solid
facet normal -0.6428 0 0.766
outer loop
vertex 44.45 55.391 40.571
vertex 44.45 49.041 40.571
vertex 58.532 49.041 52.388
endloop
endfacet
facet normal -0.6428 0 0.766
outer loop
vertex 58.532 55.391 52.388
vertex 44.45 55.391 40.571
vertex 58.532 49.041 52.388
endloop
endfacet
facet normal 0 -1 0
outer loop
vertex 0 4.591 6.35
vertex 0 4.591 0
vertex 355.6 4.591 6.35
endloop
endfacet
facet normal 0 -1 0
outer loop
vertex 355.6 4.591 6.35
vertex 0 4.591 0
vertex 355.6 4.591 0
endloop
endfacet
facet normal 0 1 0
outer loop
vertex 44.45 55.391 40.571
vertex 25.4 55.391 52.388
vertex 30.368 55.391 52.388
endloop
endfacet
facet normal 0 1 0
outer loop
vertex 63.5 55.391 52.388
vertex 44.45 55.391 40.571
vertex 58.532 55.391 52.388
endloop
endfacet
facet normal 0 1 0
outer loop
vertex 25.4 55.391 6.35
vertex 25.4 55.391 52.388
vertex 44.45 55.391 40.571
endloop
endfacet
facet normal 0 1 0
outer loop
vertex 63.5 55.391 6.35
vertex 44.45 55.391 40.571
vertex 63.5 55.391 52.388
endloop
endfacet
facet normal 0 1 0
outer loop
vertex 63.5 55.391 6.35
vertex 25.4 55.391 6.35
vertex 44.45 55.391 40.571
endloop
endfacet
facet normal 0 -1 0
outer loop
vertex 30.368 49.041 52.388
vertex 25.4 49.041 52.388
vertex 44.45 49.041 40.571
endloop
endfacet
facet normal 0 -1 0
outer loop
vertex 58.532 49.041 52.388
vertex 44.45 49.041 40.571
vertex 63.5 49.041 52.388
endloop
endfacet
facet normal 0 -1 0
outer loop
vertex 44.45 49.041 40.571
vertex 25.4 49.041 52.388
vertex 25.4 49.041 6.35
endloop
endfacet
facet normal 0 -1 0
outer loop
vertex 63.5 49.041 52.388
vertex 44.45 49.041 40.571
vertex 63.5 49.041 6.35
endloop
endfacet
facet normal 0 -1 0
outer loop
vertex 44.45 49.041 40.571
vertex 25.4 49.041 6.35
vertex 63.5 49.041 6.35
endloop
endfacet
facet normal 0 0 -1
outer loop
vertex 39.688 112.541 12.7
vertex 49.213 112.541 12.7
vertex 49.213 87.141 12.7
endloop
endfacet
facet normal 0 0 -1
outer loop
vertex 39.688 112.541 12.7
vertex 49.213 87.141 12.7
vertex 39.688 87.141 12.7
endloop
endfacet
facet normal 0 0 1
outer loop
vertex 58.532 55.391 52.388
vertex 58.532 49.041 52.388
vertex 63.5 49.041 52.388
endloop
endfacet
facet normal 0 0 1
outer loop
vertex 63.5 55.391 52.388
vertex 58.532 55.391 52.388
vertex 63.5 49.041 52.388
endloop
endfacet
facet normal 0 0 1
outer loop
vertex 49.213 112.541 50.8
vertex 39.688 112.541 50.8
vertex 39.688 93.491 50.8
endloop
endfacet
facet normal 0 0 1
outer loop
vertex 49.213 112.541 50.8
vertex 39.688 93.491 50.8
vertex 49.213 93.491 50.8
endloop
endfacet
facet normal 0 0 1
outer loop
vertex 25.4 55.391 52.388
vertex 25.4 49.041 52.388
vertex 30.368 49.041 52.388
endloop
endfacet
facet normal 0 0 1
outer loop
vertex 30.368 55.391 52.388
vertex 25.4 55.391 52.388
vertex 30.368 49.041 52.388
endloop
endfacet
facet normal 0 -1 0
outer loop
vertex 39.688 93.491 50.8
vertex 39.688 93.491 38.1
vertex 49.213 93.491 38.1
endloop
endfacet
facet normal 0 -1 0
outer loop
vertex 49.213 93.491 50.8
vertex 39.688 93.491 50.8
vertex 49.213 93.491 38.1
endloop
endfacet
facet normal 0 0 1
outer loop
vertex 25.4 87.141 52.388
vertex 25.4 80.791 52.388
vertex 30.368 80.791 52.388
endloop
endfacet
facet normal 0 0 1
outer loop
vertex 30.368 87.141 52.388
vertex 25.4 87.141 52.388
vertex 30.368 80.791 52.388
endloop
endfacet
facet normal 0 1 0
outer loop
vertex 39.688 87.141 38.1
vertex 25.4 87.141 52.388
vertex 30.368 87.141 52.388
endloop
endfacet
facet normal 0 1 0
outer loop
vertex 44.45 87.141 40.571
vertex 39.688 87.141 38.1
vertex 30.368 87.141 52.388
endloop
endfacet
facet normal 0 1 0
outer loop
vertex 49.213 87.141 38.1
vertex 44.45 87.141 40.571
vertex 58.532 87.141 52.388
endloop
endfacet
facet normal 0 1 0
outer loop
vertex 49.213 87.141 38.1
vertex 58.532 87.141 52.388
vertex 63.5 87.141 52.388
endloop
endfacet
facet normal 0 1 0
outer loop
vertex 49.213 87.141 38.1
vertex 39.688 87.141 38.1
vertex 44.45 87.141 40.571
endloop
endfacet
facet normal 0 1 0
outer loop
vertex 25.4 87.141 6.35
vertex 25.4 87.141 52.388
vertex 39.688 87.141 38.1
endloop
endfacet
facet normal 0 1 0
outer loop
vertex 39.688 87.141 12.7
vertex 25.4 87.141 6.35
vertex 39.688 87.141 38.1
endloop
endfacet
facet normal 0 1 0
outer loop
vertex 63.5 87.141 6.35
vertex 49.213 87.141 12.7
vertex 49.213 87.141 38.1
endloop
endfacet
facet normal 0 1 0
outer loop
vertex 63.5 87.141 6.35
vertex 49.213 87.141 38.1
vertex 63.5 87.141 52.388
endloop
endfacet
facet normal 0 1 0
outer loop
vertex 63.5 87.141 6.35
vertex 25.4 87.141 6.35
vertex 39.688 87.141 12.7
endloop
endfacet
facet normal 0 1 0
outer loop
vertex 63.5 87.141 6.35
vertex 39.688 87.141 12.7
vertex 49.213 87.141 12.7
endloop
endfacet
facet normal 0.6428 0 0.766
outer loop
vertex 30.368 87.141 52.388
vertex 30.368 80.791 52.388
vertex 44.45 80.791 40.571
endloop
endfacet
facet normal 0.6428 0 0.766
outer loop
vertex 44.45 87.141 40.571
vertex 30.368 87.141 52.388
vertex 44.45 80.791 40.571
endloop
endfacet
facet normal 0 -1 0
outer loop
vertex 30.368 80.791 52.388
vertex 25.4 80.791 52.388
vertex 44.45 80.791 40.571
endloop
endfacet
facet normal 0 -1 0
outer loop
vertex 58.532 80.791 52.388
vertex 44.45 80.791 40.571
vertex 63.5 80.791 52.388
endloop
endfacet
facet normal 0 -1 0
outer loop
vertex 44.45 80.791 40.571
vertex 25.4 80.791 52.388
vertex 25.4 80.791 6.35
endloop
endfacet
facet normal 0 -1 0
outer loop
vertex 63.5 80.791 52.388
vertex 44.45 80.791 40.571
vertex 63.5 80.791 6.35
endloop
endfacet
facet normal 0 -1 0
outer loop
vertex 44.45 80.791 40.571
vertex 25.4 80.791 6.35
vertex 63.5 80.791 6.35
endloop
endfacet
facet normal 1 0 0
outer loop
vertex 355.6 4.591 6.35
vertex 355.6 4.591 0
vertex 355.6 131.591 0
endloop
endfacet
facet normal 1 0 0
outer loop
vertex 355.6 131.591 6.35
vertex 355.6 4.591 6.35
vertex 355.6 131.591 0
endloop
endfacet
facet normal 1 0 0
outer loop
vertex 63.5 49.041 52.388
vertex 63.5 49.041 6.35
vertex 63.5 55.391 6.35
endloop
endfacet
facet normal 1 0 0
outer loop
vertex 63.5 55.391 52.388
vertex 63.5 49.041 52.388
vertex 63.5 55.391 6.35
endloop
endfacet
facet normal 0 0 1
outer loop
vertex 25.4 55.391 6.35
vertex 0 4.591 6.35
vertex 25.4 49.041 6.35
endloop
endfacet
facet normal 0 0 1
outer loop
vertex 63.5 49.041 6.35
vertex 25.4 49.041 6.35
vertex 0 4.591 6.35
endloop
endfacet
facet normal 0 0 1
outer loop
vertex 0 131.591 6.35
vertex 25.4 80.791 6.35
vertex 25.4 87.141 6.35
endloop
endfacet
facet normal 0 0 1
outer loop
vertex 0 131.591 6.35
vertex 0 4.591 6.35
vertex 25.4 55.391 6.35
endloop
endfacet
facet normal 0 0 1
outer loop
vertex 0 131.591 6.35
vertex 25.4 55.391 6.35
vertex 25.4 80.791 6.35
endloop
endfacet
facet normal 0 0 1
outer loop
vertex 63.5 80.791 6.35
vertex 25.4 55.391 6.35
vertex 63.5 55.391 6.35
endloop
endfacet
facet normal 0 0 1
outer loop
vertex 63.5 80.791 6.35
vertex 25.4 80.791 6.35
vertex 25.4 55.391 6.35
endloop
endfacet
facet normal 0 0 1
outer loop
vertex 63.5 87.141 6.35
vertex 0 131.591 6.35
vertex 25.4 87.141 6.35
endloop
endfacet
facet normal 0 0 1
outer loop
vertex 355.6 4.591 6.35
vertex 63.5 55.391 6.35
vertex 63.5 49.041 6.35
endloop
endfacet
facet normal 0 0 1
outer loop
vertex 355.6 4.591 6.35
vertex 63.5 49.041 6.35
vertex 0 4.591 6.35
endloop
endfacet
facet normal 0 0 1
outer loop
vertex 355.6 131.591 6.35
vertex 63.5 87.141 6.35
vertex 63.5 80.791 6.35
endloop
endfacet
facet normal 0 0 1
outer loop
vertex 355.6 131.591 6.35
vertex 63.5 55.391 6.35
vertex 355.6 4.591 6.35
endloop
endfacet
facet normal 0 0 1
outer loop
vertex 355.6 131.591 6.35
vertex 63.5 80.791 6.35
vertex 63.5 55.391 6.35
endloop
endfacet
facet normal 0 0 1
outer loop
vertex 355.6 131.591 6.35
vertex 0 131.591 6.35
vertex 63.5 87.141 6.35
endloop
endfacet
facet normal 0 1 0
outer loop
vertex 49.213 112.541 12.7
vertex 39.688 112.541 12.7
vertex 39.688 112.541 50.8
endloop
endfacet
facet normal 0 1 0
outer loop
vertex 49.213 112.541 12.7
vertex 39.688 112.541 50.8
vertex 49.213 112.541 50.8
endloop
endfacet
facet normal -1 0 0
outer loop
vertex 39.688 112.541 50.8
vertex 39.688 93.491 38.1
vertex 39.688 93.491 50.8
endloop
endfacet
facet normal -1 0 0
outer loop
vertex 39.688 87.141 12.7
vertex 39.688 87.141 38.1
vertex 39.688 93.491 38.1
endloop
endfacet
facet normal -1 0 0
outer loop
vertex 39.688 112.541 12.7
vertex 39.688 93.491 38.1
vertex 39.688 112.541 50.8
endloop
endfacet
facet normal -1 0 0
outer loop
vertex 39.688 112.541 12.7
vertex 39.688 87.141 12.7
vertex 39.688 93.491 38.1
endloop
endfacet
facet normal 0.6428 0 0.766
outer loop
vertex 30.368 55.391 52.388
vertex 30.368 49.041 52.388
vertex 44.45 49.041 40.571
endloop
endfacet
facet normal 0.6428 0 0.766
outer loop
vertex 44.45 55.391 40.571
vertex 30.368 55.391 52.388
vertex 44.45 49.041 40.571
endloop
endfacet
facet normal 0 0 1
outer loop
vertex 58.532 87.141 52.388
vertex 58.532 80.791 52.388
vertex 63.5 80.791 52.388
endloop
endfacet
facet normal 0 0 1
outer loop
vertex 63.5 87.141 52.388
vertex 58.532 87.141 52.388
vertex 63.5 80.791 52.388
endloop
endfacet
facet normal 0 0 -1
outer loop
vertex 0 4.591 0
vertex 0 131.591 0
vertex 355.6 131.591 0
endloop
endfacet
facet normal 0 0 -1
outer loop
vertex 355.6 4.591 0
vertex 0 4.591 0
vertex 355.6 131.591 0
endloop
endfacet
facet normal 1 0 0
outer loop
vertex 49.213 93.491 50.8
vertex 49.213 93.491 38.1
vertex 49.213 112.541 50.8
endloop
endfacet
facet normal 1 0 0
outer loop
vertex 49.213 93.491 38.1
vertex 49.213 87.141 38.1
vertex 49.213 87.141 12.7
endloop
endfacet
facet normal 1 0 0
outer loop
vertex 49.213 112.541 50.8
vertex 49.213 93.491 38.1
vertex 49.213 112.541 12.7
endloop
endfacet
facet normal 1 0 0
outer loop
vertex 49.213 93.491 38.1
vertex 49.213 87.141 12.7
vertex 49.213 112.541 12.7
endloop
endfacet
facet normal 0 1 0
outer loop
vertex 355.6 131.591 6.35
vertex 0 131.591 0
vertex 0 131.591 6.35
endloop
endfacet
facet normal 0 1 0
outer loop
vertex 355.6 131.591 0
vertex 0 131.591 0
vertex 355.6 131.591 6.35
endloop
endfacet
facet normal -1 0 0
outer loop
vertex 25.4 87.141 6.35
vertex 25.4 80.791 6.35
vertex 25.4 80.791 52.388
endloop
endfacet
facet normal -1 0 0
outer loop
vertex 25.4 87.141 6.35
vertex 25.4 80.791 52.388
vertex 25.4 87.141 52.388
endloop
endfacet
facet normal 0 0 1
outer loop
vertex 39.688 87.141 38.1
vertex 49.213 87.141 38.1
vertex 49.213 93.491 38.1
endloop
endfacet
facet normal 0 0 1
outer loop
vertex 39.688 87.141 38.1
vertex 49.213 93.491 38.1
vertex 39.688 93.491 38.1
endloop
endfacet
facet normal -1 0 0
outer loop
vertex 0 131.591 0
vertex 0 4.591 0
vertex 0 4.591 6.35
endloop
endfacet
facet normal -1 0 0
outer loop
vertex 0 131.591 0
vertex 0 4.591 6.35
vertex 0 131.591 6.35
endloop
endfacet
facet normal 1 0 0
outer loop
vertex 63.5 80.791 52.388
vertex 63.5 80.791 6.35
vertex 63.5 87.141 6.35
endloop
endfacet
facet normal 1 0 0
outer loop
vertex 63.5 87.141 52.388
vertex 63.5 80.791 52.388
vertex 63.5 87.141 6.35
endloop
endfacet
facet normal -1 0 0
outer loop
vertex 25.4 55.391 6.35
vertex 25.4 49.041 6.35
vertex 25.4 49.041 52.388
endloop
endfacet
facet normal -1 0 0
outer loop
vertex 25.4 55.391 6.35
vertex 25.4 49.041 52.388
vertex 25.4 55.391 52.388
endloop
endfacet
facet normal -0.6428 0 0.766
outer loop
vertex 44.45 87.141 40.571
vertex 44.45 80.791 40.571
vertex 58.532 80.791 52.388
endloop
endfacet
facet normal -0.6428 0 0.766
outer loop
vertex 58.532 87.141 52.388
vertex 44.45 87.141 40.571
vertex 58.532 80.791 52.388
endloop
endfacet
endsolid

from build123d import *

# Parameters (mm, degrees)
F0_W       = 355.6
F0_H       = 127
F1_DEPTH   = 6.35
F2_W       = 38.1
F2_H       = 6.35
F3_DEPTH   = 50.8
F3_FACE1_W = 38.1
F3_FACE1_H = 50.8
F5_DEPTH   = 50.8
F6_W       = 9.525
F6_H       = 25.4
F7_DEPTH   = 25.4
F8_W       = 9.525
F8_H       = 19.05
F9_DEPTH   = 12.7


with BuildPart() as f1:
    # F0 (on Top) → F1 (new body)
    with BuildSketch(Plane.XY):
        with Locations((177.8, 68.0911967754)):
            Rectangle(F0_W, F0_H)
    extrude(amount=F1_DEPTH)

    # F2 (on face) → F3 (join)
    with BuildSketch(Plane.XY.offset(6.35)):
        with Locations((44.45, 52.2161967754)):
            Rectangle(F2_W, F2_H)
        with Locations((44.45, 83.9661967754)):
            Rectangle(F2_W, F2_H)
    extrude(amount=F3_DEPTH)

    # F4 (on face) + F3_face1 (on face) → F5 (cut)
    with BuildSketch(Plane.XZ.offset(-49.0411967754)):
        Polygon((63.5, 57.15), (25.4, 57.15), (25.4, 52.3875), (30.3680338836, 52.3875), (44.45, 40.5713274255), (58.5319661164, 52.3875), (63.5, 52.3875), align=None)
    with BuildSketch(Plane(origin=(44.45, 87.1411967754, 31.75), x_dir=(-1, 0, 0), z_dir=(0, 1, 0))):
        Rectangle(F3_FACE1_W, F3_FACE1_H)
    extrude(amount=-F5_DEPTH, dir=(0, -1, 0), mode=Mode.SUBTRACT)

    # F6 (on face) → F7 (join)
    with BuildSketch(Plane(origin=(0, 87.1411967754, 0), x_dir=(-1, 0, 0), z_dir=(0, 1, 0))):
        with Locations((-44.45, 25.4)):
            Rectangle(F6_W, F6_H)
    extrude(amount=F7_DEPTH)

    # F8 (on face) → F9 (join)
    with BuildSketch(Plane.XY.offset(38.1)):
        with Locations((44.45, 103.0161967754)):
            Rectangle(F8_W, F8_H)
    extrude(amount=F9_DEPTH)


solid = f1.part
